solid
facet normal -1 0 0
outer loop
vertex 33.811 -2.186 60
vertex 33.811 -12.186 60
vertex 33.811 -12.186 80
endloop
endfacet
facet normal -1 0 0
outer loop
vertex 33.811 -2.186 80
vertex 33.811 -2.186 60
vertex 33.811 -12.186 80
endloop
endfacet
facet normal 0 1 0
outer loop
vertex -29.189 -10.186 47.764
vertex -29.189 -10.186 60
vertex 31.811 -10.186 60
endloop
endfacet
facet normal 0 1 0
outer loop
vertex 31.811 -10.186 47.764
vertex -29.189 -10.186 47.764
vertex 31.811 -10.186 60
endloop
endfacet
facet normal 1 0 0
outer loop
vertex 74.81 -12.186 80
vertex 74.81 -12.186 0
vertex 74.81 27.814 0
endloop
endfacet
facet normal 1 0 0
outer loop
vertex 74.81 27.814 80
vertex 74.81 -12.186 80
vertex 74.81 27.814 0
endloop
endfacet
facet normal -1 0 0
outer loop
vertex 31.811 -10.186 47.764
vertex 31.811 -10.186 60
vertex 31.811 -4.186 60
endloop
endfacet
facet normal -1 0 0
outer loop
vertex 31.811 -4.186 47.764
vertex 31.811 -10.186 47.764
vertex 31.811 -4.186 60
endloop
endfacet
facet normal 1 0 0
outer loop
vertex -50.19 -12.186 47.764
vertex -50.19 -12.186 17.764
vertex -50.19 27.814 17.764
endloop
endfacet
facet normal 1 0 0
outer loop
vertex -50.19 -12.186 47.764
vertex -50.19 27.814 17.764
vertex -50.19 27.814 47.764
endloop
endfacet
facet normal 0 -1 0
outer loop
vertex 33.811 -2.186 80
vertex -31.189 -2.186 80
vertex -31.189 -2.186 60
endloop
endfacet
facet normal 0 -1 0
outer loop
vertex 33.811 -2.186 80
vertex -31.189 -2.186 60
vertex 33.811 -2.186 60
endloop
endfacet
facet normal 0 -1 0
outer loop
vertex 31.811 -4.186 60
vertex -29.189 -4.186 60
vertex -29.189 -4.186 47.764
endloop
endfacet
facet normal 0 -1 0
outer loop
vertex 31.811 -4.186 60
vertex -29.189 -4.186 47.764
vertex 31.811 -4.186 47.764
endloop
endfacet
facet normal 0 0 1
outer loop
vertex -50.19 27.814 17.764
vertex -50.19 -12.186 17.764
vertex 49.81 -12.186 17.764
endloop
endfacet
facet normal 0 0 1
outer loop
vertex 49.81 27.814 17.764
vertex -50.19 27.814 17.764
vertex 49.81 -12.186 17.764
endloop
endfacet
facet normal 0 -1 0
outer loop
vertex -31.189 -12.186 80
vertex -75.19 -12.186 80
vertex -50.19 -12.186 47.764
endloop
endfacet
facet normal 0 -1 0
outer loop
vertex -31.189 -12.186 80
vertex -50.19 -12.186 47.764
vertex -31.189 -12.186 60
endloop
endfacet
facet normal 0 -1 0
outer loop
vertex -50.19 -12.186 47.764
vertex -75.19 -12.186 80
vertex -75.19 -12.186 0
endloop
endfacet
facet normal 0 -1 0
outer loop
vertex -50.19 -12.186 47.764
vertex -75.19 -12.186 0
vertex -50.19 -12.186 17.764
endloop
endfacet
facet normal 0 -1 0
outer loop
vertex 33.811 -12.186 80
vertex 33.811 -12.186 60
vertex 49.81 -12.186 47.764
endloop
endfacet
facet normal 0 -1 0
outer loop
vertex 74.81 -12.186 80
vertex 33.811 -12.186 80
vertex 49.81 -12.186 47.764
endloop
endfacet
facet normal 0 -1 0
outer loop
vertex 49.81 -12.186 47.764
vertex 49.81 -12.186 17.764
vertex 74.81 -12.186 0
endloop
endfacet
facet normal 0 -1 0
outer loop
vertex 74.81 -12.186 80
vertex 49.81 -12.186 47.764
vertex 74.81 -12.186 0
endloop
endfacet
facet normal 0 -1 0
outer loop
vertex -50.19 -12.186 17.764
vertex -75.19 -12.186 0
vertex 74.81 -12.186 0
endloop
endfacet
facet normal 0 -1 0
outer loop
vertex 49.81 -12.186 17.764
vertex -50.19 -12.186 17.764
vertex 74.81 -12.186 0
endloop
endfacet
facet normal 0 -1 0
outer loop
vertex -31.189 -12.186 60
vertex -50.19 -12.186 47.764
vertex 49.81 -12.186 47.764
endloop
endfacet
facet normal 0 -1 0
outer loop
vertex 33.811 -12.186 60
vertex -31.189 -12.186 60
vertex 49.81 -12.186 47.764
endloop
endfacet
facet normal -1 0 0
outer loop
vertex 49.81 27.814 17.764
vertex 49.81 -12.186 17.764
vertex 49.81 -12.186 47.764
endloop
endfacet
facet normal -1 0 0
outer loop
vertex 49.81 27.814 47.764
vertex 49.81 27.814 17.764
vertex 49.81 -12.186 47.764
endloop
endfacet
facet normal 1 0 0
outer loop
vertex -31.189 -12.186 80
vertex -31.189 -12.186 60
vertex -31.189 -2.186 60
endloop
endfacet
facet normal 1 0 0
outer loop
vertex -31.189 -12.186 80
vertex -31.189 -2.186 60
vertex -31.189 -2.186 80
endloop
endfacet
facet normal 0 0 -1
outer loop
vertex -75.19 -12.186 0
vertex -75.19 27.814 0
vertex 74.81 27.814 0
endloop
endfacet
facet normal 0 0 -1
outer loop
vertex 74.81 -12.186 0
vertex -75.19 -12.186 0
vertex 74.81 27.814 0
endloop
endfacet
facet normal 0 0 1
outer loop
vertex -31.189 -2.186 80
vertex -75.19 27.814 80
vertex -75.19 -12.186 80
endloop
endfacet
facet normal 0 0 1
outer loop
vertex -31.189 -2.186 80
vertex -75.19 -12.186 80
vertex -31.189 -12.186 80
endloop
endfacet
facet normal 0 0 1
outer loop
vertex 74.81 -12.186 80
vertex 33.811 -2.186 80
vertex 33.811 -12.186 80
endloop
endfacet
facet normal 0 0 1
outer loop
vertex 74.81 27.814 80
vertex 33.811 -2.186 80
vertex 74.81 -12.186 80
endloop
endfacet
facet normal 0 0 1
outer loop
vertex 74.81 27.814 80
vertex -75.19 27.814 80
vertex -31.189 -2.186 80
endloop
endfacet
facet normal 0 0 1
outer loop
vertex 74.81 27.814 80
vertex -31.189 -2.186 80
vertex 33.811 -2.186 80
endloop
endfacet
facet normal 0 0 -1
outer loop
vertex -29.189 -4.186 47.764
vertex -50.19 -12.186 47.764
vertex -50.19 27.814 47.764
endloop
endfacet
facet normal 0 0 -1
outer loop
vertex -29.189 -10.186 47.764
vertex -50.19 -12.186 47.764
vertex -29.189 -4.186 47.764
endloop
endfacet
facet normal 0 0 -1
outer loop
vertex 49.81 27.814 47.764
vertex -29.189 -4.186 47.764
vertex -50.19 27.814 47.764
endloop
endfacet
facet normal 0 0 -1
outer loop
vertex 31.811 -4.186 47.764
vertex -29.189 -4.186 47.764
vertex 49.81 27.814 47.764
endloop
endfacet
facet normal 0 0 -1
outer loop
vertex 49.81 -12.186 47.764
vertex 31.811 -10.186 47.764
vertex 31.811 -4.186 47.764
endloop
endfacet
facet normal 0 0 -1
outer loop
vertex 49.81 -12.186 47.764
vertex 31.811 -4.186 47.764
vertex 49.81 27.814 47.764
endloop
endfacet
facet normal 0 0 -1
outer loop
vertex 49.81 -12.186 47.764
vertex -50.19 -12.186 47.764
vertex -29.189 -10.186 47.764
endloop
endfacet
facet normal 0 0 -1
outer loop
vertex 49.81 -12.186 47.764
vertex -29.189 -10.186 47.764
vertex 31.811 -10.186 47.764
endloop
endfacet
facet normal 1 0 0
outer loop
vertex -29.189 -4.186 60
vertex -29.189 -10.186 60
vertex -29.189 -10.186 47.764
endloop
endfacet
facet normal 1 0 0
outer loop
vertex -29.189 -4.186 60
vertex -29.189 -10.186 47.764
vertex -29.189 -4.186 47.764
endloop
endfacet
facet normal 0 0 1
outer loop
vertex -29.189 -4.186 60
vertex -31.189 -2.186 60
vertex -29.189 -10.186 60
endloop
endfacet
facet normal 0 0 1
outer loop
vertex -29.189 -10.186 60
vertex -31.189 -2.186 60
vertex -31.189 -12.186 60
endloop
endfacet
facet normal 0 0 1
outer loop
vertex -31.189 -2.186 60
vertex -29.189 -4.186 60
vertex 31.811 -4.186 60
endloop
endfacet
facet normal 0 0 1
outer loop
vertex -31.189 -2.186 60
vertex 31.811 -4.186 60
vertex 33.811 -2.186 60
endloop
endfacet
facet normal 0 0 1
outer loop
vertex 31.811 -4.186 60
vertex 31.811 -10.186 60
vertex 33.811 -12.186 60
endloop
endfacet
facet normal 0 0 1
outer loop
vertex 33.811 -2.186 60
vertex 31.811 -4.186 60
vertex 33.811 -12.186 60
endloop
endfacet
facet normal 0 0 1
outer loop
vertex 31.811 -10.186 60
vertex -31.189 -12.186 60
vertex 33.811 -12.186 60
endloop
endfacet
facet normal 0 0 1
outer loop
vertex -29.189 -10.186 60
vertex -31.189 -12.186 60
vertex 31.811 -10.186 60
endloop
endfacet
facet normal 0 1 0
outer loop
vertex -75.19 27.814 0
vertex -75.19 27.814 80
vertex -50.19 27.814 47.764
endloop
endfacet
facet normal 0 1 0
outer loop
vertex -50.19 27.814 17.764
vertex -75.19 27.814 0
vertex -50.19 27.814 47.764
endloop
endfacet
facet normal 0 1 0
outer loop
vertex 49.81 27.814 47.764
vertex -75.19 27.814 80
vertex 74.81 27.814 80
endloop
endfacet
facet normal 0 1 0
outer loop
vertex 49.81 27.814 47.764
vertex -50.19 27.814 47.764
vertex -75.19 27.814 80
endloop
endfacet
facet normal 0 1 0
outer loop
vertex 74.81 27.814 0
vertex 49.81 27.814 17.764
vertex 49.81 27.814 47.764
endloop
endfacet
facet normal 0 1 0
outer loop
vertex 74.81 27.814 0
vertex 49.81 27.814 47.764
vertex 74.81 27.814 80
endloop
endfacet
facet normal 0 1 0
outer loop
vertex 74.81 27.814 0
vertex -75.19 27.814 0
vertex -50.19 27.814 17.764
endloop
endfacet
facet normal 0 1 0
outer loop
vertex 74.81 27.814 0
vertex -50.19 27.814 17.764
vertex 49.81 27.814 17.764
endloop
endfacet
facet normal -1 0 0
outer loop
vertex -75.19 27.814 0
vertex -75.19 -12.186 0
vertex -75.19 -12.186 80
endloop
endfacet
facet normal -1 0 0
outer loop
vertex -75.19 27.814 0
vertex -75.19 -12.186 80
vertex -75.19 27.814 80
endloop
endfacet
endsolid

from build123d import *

# Parameters (mm, degrees)
F0_W     = 150
F0_H     = 40
F1_DEPTH = 80
F2_W     = 65
F2_H     = 20
F3_DEPTH = 10
F4_W     = 100
F4_H     = 30
F5_DEPTH = 87.2
F6_W     = 61
F6_H     = 6
F7_DEPTH = 25


with BuildPart() as f1:
    # F0 (on Top) → F1 (new body)
    with BuildSketch(Plane.XY):
        with Locations((-0.189516, 7.814032)):
            Rectangle(F0_W, F0_H)
    extrude(amount=F1_DEPTH)

    # F2 (on face) → F3 (cut)
    with BuildSketch(Plane.XZ.offset(12.185968)):
        with Locations((1.311038, 70)):
            Rectangle(F2_W, F2_H)
    extrude(amount=-F3_DEPTH, mode=Mode.SUBTRACT)

    # F4 (on face) → F5 (cut)
    with BuildSketch(Plane.XZ.offset(12.185968)):
        with Locations((-0.189516, 32.763609)):
            Rectangle(F4_W, F4_H)
    extrude(amount=-F5_DEPTH, mode=Mode.SUBTRACT)

    # F6 (on face) → F7 (cut)
    with BuildSketch(Plane.XY.offset(60)):
        with Locations((1.311038, -7.185968)):
            Rectangle(F6_W, F6_H)
    extrude(amount=-F7_DEPTH, mode=Mode.SUBTRACT)


solid = f1.part
